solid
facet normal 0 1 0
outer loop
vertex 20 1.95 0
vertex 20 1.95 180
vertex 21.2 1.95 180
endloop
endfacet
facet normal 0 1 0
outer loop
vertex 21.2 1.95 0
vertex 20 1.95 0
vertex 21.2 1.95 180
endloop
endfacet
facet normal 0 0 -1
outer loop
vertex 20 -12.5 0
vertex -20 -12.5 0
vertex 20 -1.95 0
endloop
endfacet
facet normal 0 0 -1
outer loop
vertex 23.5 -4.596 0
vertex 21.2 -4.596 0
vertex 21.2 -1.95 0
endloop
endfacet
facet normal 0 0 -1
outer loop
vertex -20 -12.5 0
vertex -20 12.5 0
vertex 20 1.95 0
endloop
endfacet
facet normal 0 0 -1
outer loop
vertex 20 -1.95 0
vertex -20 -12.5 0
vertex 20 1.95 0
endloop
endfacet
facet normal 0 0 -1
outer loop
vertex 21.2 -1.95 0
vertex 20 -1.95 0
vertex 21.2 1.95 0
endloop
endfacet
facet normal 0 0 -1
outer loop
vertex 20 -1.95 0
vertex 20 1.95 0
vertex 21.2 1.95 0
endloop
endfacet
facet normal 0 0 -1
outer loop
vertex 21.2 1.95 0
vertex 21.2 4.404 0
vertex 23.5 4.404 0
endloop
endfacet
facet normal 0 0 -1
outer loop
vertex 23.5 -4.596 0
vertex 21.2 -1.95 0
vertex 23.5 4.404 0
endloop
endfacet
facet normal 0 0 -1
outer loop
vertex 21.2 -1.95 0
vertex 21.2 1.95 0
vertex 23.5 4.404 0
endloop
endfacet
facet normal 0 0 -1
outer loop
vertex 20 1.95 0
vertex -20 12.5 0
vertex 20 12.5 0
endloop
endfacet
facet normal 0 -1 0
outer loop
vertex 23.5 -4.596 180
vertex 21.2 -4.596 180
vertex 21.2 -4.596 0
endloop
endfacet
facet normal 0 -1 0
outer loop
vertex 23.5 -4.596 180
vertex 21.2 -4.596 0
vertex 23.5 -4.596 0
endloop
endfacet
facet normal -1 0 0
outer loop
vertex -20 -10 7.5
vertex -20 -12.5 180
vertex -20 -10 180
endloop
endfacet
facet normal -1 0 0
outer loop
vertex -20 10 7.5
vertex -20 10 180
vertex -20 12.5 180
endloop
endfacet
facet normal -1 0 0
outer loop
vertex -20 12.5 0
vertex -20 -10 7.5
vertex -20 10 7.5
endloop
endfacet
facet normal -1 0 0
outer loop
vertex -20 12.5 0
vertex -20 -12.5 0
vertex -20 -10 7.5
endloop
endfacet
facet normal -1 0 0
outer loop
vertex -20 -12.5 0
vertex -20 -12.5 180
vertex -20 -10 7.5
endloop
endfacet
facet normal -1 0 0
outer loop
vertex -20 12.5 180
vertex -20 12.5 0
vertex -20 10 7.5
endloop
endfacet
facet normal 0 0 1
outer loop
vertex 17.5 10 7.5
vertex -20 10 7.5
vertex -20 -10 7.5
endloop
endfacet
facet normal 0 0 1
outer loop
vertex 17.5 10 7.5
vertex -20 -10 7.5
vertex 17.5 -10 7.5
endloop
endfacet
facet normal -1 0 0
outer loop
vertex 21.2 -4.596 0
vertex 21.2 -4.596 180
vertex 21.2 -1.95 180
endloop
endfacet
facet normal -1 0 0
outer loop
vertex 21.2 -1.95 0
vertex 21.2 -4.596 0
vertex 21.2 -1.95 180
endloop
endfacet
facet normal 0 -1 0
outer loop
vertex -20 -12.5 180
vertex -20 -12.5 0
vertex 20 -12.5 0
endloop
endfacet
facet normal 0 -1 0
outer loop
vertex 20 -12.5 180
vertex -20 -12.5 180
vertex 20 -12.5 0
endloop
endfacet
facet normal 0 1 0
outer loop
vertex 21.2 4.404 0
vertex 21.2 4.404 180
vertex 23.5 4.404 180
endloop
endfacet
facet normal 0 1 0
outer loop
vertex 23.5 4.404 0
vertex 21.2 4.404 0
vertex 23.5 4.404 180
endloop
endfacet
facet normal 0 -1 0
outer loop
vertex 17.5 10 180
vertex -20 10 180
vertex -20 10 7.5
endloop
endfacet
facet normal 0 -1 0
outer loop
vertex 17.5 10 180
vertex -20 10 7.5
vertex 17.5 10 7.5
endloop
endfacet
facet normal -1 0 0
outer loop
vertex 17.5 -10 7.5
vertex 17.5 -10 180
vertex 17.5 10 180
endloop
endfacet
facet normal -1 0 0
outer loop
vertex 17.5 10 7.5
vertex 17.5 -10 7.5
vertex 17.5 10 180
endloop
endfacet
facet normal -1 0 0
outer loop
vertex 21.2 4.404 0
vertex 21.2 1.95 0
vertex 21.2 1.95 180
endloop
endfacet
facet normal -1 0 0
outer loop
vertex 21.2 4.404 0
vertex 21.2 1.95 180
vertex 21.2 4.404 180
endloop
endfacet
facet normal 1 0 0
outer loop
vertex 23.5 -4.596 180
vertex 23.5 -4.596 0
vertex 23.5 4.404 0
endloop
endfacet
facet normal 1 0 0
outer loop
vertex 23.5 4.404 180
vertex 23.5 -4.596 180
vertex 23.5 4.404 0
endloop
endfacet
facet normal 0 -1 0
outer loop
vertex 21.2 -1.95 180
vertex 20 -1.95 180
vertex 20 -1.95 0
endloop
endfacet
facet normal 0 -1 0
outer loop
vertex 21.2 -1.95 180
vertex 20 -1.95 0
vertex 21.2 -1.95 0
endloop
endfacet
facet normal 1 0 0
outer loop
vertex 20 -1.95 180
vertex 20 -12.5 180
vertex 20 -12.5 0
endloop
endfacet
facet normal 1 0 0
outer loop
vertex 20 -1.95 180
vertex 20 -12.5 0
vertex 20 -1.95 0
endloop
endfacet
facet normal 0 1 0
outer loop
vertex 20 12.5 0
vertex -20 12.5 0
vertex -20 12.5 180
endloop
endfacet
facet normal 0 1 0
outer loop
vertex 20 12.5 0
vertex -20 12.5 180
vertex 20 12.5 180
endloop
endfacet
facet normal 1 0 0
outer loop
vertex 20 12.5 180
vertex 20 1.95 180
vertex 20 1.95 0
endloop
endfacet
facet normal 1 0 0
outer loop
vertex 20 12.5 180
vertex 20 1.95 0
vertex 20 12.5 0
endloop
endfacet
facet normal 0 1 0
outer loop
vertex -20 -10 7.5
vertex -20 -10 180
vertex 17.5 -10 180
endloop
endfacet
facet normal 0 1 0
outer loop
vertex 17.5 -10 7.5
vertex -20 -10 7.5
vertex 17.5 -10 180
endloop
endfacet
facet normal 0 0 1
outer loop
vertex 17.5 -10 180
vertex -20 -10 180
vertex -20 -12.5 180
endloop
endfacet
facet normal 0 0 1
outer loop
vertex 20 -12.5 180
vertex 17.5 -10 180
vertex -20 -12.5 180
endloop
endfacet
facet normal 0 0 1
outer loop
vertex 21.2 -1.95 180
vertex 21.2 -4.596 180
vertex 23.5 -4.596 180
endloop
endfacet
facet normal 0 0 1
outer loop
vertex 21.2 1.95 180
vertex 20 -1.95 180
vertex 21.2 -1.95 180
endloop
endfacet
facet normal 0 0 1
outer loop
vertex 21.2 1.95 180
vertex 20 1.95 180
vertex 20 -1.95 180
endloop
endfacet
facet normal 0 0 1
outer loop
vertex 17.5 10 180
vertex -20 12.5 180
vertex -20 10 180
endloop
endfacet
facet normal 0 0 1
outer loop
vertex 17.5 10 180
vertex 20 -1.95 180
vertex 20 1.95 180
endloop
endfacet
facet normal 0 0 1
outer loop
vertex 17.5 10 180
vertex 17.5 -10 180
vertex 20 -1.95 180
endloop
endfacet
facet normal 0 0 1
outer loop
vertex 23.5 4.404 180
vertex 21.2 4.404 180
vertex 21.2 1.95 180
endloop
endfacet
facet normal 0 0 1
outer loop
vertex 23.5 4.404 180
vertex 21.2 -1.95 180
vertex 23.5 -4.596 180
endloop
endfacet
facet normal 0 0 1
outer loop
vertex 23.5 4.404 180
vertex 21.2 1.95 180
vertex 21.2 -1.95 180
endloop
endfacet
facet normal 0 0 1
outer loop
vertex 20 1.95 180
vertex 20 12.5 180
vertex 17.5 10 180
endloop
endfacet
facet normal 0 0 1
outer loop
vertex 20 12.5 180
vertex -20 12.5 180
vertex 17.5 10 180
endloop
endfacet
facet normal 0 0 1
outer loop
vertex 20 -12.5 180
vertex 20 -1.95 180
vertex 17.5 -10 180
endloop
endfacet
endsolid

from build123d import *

# Parameters (mm, degrees)
SKETCH_W     = 40
SKETCH_H     = 25
PAD_DEPTH    = 180
SKETCH001_W  = 39.599754
SKETCH001_H  = 20
POCKET_DEPTH = 172.5
SKETCH002_W  = 1.967115
SKETCH002_H  = 3.9
PAD001_DEPTH = 180
SKETCH003_W  = 2.3
SKETCH003_H  = 9
PAD002_DEPTH = 180


with BuildPart() as part:
    # Sketch → Pad (new body)
    with BuildSketch(Plane.XY):
        Rectangle(SKETCH_W, SKETCH_H)
    extrude(amount=PAD_DEPTH)

    # Sketch001 (on Face6 of Pad) → Pocket (cut)
    with BuildSketch(Plane.XY.offset(180)):
        with Locations((-2.299877, 0)):
            Rectangle(SKETCH001_W, SKETCH001_H)
    extrude(amount=-POCKET_DEPTH, mode=Mode.SUBTRACT)

    # Sketch002 (on Face5 of Pocket) → Pad001 (join)
    with BuildSketch(Plane.XY.offset(180)):
        with Locations((20.2164425, 0)):
            Rectangle(SKETCH002_W, SKETCH002_H)
    extrude(amount=-PAD001_DEPTH)

    # Sketch003 (on DatumPlane) → Pad002 (join)
    with BuildSketch(Plane.XY.offset(180)):
        with Locations((22.35, -0.0960954544)):
            Rectangle(SKETCH003_W, SKETCH003_H)
    extrude(amount=-PAD002_DEPTH)


solid = part.part
